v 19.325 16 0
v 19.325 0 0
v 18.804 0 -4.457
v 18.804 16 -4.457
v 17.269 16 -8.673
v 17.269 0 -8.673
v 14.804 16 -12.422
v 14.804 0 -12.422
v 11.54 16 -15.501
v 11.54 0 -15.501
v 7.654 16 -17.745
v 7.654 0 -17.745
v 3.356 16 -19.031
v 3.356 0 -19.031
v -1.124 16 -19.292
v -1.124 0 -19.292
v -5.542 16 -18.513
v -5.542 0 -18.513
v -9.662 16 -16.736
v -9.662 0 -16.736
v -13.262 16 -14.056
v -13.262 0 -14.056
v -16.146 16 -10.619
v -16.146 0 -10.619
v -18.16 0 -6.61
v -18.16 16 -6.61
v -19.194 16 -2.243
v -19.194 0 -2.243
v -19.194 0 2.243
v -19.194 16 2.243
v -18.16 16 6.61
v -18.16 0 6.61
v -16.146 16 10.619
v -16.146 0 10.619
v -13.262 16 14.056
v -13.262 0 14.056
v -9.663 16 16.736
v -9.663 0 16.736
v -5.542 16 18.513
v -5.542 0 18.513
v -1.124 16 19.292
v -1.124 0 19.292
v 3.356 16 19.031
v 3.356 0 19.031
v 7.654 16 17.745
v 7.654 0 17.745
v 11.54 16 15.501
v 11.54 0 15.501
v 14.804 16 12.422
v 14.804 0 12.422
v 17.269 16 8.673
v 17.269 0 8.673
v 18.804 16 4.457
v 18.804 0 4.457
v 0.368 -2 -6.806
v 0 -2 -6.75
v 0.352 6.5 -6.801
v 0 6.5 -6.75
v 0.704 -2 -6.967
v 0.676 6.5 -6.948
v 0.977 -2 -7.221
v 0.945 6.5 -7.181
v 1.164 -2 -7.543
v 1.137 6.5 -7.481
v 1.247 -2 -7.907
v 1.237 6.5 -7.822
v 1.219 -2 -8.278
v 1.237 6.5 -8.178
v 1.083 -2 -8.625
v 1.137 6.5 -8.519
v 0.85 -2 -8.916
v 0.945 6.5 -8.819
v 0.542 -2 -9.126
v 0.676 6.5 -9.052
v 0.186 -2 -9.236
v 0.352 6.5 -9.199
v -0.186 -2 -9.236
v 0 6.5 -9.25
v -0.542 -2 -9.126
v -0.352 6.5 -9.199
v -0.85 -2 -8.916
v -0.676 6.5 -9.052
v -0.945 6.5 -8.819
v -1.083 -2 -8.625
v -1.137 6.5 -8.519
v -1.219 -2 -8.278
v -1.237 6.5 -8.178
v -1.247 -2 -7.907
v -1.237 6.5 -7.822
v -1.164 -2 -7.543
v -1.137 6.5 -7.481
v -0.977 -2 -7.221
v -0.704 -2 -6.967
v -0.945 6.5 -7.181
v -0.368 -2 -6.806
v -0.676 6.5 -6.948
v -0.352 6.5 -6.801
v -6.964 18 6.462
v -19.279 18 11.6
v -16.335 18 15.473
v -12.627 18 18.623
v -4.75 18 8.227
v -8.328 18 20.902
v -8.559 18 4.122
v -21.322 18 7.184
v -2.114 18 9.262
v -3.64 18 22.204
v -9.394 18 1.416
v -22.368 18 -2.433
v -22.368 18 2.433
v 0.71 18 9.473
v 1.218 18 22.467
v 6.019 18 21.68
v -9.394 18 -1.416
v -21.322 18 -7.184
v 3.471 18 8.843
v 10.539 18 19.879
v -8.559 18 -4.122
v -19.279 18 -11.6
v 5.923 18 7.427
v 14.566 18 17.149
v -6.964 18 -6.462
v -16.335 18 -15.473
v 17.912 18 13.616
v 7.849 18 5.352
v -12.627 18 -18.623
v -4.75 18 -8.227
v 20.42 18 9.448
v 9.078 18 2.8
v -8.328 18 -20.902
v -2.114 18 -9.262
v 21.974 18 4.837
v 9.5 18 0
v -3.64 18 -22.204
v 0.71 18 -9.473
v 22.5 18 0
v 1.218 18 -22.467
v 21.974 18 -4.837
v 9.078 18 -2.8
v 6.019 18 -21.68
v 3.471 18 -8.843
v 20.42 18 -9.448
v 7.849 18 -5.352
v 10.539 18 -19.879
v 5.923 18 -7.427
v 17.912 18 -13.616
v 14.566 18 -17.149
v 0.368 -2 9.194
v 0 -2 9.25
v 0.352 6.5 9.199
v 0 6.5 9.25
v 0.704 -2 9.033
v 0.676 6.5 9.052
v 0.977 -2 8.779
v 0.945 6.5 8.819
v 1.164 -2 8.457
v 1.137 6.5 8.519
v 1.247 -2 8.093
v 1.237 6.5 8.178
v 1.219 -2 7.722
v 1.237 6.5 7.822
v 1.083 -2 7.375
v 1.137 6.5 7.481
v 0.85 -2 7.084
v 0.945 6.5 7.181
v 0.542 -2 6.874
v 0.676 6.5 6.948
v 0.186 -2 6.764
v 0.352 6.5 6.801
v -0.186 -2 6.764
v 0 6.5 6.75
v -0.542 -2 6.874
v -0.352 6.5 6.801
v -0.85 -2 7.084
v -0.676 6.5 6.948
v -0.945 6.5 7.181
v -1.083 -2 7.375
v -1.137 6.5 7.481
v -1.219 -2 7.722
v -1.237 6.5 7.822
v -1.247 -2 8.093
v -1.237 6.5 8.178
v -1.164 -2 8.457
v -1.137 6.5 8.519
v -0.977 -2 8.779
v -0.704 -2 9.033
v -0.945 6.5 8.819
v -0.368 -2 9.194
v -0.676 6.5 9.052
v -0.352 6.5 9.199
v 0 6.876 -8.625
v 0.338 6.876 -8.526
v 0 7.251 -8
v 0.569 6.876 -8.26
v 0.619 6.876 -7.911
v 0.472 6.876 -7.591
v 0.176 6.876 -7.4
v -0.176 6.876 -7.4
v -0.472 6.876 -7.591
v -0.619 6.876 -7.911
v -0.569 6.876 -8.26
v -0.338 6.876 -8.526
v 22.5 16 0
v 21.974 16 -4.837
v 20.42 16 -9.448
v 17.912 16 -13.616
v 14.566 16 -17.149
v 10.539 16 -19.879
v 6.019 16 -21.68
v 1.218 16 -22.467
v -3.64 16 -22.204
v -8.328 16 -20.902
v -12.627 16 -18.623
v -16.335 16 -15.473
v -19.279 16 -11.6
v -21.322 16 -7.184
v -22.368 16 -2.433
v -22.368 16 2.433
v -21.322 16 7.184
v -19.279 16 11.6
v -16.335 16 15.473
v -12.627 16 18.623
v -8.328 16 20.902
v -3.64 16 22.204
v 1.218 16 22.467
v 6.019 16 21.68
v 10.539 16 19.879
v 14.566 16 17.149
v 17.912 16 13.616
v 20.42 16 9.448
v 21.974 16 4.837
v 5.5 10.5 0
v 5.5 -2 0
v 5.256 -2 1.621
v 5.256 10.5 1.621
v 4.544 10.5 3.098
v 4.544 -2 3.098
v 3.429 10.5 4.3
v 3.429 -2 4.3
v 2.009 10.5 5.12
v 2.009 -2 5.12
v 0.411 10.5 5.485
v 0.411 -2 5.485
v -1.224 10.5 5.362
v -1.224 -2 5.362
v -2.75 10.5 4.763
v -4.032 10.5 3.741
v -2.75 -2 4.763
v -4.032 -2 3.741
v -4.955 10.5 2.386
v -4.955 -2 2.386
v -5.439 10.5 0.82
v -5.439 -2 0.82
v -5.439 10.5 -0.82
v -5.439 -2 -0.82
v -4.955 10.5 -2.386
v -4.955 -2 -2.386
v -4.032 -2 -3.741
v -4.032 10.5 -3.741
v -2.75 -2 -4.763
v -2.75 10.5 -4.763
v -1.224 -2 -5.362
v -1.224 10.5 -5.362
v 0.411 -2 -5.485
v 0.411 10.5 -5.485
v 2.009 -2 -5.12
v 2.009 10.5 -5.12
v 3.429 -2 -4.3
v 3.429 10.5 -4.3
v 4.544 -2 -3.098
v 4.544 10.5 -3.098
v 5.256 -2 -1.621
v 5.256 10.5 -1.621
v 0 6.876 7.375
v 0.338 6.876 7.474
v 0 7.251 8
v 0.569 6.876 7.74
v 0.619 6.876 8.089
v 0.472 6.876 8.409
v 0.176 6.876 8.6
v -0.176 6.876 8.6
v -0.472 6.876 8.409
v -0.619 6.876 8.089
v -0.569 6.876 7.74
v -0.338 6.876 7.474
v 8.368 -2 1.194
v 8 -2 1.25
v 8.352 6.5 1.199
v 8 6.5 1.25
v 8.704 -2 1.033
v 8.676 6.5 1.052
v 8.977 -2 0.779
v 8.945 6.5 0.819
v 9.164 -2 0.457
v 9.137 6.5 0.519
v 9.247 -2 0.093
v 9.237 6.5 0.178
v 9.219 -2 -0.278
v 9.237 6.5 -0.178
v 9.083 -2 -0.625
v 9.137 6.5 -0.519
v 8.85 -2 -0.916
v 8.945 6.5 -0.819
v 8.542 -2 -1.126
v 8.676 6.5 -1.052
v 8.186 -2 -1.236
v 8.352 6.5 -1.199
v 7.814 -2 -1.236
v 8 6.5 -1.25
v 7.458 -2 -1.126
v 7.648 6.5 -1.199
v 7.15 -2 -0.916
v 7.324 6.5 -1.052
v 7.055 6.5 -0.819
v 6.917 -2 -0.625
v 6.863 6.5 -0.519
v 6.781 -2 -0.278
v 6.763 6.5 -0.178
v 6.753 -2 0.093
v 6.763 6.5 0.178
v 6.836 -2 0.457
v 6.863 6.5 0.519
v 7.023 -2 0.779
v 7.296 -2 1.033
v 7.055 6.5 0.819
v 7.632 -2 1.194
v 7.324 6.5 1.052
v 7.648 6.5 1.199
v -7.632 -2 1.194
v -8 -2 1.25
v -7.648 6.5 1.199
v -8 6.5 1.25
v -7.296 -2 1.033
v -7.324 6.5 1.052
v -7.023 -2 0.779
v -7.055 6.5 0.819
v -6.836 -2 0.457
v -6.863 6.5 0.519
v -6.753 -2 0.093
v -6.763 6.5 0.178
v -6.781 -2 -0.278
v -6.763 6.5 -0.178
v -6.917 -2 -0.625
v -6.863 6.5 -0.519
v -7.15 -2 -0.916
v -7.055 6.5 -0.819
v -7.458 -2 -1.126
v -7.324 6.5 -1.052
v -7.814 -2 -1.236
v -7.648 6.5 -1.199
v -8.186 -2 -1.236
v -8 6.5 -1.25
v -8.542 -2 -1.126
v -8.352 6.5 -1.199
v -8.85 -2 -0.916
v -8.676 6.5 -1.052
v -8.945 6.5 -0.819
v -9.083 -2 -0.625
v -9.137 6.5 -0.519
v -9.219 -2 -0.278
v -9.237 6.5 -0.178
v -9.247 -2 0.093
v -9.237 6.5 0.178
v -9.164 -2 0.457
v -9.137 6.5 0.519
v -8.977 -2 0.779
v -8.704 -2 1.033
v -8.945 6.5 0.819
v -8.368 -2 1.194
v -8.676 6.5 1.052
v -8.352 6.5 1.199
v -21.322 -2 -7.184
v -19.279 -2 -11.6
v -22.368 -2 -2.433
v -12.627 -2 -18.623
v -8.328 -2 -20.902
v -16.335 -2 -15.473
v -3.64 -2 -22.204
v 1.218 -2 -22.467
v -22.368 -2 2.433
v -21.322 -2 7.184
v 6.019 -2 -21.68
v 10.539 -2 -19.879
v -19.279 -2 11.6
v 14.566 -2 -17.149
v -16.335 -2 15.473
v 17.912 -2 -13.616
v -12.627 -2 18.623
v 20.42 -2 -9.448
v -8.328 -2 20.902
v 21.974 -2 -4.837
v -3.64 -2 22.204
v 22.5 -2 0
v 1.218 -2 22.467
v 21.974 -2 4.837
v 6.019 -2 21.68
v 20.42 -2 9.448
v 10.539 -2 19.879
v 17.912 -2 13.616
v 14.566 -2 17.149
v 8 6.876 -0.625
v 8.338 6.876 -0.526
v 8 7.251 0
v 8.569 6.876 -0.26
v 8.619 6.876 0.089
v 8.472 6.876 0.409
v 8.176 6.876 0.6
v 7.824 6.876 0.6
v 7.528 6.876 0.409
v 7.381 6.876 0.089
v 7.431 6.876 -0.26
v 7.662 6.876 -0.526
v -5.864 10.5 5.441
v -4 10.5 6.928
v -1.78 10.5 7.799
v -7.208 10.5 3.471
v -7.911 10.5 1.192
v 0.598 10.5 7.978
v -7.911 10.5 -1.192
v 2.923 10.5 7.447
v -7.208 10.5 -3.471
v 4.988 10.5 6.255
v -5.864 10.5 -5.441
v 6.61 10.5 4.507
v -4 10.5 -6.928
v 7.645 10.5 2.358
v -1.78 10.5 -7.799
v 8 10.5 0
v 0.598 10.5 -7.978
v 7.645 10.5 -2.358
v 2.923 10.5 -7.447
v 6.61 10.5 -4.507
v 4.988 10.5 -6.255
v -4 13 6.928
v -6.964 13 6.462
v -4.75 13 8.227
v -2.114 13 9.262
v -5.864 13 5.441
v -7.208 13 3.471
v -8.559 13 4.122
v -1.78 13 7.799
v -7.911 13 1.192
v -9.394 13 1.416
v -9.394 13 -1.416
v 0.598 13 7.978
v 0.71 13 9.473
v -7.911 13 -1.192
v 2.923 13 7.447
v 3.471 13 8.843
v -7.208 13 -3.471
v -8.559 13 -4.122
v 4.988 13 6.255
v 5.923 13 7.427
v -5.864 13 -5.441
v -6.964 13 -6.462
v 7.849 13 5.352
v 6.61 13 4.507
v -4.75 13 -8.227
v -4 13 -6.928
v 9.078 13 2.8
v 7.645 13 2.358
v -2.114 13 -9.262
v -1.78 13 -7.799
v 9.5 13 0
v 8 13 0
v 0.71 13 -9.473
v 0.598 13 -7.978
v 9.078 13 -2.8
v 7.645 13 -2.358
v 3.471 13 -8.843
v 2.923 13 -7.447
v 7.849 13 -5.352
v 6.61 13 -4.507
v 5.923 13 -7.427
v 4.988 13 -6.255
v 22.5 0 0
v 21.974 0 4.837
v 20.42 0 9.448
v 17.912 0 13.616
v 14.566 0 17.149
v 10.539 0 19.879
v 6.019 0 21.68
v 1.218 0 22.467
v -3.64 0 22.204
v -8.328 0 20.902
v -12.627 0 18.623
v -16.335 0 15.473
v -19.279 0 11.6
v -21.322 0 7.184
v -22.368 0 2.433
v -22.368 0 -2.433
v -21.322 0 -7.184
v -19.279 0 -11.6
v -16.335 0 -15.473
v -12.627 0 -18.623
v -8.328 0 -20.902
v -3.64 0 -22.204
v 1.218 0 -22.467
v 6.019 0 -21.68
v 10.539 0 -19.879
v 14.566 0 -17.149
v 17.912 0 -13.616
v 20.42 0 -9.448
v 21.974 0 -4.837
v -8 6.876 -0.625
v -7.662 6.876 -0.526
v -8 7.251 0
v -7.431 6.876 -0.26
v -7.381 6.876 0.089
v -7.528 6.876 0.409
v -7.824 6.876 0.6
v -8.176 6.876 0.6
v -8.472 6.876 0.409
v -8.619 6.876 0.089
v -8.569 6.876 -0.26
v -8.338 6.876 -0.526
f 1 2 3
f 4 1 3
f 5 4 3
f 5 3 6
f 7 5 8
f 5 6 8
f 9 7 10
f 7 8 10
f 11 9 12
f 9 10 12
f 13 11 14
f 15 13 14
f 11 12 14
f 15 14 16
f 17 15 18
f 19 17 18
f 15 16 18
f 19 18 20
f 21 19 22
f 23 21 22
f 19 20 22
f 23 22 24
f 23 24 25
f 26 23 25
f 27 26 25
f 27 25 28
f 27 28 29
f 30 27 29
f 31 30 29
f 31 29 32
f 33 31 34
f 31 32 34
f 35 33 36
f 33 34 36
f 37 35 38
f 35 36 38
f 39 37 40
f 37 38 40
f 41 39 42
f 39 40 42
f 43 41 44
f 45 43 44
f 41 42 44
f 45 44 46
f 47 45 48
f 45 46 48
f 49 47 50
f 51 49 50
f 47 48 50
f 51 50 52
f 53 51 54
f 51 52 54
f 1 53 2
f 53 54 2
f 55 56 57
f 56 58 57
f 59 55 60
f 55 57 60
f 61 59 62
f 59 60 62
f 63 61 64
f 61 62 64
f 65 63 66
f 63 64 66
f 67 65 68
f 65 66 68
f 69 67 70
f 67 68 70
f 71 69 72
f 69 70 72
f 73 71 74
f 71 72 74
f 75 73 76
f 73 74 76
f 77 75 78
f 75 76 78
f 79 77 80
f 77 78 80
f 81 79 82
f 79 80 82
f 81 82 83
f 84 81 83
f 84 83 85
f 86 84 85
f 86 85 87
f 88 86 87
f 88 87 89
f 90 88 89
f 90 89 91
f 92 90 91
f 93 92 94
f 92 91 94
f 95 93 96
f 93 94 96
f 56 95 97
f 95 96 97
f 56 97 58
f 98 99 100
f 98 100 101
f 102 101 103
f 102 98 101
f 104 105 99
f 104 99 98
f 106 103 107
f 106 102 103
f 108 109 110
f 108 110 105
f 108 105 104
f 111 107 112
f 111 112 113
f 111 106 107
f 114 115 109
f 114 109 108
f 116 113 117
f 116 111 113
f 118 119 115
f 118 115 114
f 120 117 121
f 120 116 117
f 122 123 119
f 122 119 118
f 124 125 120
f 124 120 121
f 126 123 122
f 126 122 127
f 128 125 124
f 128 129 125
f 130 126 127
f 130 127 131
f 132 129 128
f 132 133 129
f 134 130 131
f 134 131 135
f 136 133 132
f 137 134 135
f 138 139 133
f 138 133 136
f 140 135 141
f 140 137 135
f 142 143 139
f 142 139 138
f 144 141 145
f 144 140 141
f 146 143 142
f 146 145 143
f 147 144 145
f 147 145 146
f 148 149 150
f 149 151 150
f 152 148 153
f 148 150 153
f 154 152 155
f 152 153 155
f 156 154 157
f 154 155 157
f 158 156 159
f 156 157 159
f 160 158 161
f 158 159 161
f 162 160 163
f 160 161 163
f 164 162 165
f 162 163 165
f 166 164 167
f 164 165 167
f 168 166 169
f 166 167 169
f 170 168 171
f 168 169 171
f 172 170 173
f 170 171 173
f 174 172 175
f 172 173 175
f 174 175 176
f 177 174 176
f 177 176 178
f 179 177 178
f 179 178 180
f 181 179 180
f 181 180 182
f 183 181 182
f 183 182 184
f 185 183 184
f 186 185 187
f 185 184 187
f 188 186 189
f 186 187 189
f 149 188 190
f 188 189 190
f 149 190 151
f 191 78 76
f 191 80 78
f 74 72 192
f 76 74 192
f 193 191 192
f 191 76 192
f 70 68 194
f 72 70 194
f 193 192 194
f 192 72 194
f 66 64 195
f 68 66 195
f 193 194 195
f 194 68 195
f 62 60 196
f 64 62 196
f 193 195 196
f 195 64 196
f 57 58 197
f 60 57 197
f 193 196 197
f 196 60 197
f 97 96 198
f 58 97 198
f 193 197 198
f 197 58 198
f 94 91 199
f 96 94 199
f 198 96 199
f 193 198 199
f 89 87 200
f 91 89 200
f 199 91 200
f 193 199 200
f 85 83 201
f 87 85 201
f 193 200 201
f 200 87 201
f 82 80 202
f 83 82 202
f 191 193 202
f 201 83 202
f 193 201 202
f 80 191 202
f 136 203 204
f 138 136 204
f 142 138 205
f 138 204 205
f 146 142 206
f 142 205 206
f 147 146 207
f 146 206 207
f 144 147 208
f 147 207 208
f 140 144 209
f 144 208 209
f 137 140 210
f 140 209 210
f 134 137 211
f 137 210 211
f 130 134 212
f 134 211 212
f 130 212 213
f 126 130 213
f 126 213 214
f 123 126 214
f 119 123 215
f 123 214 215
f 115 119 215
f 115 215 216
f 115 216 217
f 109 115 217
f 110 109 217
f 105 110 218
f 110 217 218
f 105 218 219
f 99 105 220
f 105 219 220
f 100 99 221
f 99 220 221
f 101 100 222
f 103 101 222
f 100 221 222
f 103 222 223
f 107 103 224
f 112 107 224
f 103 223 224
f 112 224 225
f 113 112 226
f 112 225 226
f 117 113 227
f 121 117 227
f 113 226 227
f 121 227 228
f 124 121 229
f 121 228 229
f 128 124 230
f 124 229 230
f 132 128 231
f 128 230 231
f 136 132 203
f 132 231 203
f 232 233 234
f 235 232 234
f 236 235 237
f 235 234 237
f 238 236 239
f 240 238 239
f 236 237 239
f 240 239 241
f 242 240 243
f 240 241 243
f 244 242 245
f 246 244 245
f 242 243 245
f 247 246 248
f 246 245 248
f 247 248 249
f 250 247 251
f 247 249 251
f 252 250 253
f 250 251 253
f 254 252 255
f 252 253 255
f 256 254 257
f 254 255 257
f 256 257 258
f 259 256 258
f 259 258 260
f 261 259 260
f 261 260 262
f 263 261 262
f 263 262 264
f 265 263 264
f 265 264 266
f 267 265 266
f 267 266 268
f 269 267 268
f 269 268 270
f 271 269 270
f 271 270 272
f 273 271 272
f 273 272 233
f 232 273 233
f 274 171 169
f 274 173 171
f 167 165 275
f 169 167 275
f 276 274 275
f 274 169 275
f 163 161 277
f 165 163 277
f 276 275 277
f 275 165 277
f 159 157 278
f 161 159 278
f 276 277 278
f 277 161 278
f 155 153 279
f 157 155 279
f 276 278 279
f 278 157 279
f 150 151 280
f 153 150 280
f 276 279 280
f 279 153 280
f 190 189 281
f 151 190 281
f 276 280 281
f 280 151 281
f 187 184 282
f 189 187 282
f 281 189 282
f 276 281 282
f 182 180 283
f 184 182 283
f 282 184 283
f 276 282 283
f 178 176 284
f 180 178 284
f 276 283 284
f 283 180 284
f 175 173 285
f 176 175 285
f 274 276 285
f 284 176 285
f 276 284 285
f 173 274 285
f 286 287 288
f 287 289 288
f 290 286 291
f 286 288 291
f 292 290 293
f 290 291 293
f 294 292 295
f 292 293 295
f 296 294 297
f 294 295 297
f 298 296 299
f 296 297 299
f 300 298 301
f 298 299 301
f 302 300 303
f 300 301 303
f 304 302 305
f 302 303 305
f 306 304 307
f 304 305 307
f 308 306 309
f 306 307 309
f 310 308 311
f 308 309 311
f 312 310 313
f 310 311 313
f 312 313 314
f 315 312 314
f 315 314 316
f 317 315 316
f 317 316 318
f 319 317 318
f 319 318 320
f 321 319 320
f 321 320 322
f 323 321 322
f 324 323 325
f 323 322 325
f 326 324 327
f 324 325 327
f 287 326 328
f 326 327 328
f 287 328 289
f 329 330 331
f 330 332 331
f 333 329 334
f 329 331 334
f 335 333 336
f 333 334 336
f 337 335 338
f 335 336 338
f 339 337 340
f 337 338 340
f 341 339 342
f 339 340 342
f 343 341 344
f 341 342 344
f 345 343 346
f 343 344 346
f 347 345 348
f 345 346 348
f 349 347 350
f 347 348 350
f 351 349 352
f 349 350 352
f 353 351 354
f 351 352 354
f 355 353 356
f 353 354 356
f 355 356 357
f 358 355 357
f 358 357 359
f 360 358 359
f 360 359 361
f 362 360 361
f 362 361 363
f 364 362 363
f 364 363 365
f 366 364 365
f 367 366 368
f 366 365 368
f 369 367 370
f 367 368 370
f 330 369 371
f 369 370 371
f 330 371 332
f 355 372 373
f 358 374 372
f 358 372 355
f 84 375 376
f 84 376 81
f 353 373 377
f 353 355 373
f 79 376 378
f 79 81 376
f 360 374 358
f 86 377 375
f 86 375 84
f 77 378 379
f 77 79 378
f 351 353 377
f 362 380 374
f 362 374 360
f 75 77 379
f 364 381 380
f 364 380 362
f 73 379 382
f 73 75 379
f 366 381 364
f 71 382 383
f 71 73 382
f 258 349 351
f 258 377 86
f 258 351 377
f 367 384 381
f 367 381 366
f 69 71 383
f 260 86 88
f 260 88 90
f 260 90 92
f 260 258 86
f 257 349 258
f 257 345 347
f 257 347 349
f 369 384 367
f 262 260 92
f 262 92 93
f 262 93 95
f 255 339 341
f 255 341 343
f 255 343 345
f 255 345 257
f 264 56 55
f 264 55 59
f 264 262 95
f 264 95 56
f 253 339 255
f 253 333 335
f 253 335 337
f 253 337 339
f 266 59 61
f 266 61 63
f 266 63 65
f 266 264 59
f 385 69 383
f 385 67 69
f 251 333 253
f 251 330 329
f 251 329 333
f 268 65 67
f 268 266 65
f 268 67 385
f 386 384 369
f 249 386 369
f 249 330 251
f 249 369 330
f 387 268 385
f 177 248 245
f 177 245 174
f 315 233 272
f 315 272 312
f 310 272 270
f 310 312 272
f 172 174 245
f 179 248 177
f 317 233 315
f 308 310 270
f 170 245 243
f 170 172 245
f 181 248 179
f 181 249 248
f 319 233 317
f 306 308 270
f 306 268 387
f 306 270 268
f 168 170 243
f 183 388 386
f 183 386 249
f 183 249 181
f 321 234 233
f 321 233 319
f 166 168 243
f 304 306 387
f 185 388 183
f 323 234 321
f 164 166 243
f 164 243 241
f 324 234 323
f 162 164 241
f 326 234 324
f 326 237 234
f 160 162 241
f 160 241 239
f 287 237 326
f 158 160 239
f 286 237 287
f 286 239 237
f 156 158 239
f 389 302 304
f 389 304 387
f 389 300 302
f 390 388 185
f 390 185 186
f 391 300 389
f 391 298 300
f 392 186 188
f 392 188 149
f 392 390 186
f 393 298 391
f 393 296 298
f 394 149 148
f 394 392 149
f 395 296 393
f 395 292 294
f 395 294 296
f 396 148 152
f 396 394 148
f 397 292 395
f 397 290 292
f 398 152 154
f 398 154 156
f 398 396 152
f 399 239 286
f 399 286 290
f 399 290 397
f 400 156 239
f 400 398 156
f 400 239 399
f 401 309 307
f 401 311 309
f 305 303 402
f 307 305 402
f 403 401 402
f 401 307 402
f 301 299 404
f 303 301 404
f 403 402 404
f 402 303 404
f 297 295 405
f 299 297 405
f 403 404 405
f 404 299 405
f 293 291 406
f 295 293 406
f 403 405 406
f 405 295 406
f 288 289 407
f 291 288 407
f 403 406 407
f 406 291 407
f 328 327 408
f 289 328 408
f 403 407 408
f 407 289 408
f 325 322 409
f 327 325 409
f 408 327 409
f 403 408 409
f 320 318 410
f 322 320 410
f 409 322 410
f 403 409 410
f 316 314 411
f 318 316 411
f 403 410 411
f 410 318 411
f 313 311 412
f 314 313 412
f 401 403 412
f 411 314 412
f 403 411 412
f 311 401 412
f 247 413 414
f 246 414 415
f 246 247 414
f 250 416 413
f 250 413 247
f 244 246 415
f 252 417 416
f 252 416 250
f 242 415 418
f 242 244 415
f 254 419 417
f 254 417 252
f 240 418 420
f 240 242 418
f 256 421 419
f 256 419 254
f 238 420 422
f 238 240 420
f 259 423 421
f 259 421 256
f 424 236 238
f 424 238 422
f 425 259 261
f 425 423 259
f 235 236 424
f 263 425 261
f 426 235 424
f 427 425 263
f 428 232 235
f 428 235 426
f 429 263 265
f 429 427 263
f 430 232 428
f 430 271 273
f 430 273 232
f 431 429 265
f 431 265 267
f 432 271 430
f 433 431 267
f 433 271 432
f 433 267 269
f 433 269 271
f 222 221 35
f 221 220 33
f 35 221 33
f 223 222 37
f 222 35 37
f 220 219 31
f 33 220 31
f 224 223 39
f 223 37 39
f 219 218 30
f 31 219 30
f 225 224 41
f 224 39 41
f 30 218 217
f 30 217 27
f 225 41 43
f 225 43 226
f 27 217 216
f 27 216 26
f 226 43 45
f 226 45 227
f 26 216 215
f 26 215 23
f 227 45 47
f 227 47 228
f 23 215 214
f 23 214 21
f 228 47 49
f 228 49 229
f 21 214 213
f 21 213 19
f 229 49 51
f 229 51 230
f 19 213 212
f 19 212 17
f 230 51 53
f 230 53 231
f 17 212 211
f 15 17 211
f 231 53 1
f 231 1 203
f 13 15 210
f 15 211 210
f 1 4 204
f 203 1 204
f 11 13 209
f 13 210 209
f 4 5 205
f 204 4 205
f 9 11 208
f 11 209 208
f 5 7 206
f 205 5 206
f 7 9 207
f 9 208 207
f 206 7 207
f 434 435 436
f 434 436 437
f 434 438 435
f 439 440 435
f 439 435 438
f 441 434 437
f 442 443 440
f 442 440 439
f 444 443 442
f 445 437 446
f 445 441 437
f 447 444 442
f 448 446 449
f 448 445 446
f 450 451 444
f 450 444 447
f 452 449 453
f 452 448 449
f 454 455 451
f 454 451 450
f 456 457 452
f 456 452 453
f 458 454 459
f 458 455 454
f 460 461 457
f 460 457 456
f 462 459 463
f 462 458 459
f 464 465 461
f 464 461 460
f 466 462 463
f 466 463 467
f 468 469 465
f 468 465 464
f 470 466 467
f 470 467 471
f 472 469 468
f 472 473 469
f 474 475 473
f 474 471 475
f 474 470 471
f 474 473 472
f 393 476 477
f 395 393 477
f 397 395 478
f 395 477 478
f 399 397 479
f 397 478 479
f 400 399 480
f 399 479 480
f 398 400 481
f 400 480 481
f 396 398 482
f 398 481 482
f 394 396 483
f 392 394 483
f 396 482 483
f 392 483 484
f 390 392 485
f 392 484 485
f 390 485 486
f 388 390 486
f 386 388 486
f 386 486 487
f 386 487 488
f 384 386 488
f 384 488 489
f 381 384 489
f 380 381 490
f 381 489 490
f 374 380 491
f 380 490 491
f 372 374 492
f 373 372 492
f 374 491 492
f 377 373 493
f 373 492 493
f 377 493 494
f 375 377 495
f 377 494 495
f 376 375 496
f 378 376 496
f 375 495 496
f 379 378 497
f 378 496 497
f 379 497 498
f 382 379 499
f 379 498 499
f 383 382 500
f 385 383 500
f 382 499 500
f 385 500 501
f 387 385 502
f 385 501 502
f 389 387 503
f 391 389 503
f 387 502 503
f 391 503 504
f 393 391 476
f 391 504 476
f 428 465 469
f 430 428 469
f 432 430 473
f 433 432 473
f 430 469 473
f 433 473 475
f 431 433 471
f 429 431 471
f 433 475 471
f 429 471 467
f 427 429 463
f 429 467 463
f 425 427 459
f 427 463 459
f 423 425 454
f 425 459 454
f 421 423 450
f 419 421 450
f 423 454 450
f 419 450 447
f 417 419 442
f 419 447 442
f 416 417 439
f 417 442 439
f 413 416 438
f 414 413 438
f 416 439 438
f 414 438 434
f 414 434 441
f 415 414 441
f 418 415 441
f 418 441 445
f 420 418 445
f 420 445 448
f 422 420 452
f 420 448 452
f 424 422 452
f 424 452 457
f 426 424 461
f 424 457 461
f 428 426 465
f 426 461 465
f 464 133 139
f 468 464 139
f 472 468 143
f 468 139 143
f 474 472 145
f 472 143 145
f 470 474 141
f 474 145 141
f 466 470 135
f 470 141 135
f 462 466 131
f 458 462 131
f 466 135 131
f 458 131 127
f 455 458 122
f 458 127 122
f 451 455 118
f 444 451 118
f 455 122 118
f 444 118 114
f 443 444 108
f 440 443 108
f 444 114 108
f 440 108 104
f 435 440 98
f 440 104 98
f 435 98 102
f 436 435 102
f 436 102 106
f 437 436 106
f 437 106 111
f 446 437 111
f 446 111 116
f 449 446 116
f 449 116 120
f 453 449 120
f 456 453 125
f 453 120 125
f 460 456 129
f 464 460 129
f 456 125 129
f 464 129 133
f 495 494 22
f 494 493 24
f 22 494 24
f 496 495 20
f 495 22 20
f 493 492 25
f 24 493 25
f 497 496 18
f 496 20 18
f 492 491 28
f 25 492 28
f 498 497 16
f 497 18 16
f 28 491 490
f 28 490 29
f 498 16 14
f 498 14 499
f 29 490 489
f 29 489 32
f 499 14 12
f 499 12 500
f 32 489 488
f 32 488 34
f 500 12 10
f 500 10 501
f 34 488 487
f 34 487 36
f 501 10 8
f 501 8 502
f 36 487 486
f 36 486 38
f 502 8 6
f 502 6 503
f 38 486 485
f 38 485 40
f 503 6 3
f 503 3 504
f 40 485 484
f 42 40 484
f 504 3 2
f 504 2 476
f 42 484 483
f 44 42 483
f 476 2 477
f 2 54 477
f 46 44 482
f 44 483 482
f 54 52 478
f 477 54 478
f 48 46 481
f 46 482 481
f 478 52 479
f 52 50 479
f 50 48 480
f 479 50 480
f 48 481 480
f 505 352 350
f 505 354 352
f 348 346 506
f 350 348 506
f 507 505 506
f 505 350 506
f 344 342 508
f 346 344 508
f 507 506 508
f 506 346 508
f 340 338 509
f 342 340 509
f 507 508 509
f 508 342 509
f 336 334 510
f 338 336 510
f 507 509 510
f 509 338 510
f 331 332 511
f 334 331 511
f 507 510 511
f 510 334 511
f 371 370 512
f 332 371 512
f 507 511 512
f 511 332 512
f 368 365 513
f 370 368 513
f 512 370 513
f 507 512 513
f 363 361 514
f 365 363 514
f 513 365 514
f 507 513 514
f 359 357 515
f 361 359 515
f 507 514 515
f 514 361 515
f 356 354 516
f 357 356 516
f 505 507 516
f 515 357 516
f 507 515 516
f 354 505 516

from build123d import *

# Parameters (mm, degrees)
SKETCH_1_R             = 19.325
SKETCH_1_R_2           = 2.5
EXTRUDE_1_DEPTH        = 16
SKETCH_2_R             = 22.5
SKETCH_2_R_2           = 2.5
EXTRUDE_2_DEPTH        = 2
SKETCH_3_R             = 22.5
SKETCH_3_R_2           = 2.5
EXTRUDE_3_DEPTH        = 2
SKETCH_4_R             = 5.5
CUT_EXTRUDE_1_DEPTH    = 20
HOLE_WIZARD_M3_1_D     = 2.5
HOLE_WIZARD_M3_1_DEPTH = 8.5
HOLE_WIZARD_M3_1_TIP   = 0.751075774
SKETCH_7_R             = 9.5
CUT_EXTRUDE_3_DEPTH    = 5
SKETCH_8_R             = 8
CUT_EXTRUDE_4_DEPTH    = 2.5


with BuildPart() as part:
    # 草图1 → 凸台-拉伸1 (new body)
    with BuildSketch(Plane(origin=(0, 0, 0), x_dir=(1, 0, 0), z_dir=(0, 1, 0))):
        Circle(SKETCH_1_R)
        Circle(SKETCH_1_R_2, mode=Mode.SUBTRACT)
    extrude(amount=EXTRUDE_1_DEPTH)

    # 草图2 → 凸台-拉伸2 (add)
    with BuildSketch(Plane(origin=(0, 16, 0), x_dir=(1, 0, 0), z_dir=(0, 1, 0))):
        Circle(SKETCH_2_R)
        Circle(SKETCH_2_R_2, mode=Mode.SUBTRACT)
    extrude(amount=EXTRUDE_2_DEPTH)

    # 草图3 → 凸台-拉伸3 (add)
    with BuildSketch(Plane.XZ):
        Circle(SKETCH_3_R)
        Circle(SKETCH_3_R_2, mode=Mode.SUBTRACT)
    extrude(amount=EXTRUDE_3_DEPTH)

    # 草图4 → 切除-拉伸1 (cut)
    with BuildSketch(Plane.XZ.offset(2)):
        Circle(SKETCH_4_R)
    extrude(amount=-CUT_EXTRUDE_1_DEPTH, mode=Mode.SUBTRACT)

    # M3 螺纹孔1
    with Locations(Plane(origin=(0, -2, 8), x_dir=(0, 0, -1), z_dir=(0, -1, 0))):
        with Locations((0, 0), (8, 8), (16, 0), (8, -8)):
            Hole(HOLE_WIZARD_M3_1_D / 2, depth=HOLE_WIZARD_M3_1_DEPTH)
            with Locations((0, 0, -(HOLE_WIZARD_M3_1_DEPTH + HOLE_WIZARD_M3_1_TIP / 2))):  # 118° drill point
                Cone(0, HOLE_WIZARD_M3_1_D / 2, HOLE_WIZARD_M3_1_TIP, mode=Mode.SUBTRACT)

    # 草图7 → 切除-拉伸3 (cut)
    with BuildSketch(Plane(origin=(0, 18, 0), x_dir=(1, 0, 0), z_dir=(0, 1, 0))):
        Circle(SKETCH_7_R)
    extrude(amount=-CUT_EXTRUDE_3_DEPTH, mode=Mode.SUBTRACT)

    # 草图8 → 切除-拉伸4 (cut)
    with BuildSketch(Plane(origin=(0, 13, 0), x_dir=(1, 0, 0), z_dir=(0, 1, 0))):
        Circle(SKETCH_8_R)
    extrude(amount=-CUT_EXTRUDE_4_DEPTH, mode=Mode.SUBTRACT)


solid = part.part
